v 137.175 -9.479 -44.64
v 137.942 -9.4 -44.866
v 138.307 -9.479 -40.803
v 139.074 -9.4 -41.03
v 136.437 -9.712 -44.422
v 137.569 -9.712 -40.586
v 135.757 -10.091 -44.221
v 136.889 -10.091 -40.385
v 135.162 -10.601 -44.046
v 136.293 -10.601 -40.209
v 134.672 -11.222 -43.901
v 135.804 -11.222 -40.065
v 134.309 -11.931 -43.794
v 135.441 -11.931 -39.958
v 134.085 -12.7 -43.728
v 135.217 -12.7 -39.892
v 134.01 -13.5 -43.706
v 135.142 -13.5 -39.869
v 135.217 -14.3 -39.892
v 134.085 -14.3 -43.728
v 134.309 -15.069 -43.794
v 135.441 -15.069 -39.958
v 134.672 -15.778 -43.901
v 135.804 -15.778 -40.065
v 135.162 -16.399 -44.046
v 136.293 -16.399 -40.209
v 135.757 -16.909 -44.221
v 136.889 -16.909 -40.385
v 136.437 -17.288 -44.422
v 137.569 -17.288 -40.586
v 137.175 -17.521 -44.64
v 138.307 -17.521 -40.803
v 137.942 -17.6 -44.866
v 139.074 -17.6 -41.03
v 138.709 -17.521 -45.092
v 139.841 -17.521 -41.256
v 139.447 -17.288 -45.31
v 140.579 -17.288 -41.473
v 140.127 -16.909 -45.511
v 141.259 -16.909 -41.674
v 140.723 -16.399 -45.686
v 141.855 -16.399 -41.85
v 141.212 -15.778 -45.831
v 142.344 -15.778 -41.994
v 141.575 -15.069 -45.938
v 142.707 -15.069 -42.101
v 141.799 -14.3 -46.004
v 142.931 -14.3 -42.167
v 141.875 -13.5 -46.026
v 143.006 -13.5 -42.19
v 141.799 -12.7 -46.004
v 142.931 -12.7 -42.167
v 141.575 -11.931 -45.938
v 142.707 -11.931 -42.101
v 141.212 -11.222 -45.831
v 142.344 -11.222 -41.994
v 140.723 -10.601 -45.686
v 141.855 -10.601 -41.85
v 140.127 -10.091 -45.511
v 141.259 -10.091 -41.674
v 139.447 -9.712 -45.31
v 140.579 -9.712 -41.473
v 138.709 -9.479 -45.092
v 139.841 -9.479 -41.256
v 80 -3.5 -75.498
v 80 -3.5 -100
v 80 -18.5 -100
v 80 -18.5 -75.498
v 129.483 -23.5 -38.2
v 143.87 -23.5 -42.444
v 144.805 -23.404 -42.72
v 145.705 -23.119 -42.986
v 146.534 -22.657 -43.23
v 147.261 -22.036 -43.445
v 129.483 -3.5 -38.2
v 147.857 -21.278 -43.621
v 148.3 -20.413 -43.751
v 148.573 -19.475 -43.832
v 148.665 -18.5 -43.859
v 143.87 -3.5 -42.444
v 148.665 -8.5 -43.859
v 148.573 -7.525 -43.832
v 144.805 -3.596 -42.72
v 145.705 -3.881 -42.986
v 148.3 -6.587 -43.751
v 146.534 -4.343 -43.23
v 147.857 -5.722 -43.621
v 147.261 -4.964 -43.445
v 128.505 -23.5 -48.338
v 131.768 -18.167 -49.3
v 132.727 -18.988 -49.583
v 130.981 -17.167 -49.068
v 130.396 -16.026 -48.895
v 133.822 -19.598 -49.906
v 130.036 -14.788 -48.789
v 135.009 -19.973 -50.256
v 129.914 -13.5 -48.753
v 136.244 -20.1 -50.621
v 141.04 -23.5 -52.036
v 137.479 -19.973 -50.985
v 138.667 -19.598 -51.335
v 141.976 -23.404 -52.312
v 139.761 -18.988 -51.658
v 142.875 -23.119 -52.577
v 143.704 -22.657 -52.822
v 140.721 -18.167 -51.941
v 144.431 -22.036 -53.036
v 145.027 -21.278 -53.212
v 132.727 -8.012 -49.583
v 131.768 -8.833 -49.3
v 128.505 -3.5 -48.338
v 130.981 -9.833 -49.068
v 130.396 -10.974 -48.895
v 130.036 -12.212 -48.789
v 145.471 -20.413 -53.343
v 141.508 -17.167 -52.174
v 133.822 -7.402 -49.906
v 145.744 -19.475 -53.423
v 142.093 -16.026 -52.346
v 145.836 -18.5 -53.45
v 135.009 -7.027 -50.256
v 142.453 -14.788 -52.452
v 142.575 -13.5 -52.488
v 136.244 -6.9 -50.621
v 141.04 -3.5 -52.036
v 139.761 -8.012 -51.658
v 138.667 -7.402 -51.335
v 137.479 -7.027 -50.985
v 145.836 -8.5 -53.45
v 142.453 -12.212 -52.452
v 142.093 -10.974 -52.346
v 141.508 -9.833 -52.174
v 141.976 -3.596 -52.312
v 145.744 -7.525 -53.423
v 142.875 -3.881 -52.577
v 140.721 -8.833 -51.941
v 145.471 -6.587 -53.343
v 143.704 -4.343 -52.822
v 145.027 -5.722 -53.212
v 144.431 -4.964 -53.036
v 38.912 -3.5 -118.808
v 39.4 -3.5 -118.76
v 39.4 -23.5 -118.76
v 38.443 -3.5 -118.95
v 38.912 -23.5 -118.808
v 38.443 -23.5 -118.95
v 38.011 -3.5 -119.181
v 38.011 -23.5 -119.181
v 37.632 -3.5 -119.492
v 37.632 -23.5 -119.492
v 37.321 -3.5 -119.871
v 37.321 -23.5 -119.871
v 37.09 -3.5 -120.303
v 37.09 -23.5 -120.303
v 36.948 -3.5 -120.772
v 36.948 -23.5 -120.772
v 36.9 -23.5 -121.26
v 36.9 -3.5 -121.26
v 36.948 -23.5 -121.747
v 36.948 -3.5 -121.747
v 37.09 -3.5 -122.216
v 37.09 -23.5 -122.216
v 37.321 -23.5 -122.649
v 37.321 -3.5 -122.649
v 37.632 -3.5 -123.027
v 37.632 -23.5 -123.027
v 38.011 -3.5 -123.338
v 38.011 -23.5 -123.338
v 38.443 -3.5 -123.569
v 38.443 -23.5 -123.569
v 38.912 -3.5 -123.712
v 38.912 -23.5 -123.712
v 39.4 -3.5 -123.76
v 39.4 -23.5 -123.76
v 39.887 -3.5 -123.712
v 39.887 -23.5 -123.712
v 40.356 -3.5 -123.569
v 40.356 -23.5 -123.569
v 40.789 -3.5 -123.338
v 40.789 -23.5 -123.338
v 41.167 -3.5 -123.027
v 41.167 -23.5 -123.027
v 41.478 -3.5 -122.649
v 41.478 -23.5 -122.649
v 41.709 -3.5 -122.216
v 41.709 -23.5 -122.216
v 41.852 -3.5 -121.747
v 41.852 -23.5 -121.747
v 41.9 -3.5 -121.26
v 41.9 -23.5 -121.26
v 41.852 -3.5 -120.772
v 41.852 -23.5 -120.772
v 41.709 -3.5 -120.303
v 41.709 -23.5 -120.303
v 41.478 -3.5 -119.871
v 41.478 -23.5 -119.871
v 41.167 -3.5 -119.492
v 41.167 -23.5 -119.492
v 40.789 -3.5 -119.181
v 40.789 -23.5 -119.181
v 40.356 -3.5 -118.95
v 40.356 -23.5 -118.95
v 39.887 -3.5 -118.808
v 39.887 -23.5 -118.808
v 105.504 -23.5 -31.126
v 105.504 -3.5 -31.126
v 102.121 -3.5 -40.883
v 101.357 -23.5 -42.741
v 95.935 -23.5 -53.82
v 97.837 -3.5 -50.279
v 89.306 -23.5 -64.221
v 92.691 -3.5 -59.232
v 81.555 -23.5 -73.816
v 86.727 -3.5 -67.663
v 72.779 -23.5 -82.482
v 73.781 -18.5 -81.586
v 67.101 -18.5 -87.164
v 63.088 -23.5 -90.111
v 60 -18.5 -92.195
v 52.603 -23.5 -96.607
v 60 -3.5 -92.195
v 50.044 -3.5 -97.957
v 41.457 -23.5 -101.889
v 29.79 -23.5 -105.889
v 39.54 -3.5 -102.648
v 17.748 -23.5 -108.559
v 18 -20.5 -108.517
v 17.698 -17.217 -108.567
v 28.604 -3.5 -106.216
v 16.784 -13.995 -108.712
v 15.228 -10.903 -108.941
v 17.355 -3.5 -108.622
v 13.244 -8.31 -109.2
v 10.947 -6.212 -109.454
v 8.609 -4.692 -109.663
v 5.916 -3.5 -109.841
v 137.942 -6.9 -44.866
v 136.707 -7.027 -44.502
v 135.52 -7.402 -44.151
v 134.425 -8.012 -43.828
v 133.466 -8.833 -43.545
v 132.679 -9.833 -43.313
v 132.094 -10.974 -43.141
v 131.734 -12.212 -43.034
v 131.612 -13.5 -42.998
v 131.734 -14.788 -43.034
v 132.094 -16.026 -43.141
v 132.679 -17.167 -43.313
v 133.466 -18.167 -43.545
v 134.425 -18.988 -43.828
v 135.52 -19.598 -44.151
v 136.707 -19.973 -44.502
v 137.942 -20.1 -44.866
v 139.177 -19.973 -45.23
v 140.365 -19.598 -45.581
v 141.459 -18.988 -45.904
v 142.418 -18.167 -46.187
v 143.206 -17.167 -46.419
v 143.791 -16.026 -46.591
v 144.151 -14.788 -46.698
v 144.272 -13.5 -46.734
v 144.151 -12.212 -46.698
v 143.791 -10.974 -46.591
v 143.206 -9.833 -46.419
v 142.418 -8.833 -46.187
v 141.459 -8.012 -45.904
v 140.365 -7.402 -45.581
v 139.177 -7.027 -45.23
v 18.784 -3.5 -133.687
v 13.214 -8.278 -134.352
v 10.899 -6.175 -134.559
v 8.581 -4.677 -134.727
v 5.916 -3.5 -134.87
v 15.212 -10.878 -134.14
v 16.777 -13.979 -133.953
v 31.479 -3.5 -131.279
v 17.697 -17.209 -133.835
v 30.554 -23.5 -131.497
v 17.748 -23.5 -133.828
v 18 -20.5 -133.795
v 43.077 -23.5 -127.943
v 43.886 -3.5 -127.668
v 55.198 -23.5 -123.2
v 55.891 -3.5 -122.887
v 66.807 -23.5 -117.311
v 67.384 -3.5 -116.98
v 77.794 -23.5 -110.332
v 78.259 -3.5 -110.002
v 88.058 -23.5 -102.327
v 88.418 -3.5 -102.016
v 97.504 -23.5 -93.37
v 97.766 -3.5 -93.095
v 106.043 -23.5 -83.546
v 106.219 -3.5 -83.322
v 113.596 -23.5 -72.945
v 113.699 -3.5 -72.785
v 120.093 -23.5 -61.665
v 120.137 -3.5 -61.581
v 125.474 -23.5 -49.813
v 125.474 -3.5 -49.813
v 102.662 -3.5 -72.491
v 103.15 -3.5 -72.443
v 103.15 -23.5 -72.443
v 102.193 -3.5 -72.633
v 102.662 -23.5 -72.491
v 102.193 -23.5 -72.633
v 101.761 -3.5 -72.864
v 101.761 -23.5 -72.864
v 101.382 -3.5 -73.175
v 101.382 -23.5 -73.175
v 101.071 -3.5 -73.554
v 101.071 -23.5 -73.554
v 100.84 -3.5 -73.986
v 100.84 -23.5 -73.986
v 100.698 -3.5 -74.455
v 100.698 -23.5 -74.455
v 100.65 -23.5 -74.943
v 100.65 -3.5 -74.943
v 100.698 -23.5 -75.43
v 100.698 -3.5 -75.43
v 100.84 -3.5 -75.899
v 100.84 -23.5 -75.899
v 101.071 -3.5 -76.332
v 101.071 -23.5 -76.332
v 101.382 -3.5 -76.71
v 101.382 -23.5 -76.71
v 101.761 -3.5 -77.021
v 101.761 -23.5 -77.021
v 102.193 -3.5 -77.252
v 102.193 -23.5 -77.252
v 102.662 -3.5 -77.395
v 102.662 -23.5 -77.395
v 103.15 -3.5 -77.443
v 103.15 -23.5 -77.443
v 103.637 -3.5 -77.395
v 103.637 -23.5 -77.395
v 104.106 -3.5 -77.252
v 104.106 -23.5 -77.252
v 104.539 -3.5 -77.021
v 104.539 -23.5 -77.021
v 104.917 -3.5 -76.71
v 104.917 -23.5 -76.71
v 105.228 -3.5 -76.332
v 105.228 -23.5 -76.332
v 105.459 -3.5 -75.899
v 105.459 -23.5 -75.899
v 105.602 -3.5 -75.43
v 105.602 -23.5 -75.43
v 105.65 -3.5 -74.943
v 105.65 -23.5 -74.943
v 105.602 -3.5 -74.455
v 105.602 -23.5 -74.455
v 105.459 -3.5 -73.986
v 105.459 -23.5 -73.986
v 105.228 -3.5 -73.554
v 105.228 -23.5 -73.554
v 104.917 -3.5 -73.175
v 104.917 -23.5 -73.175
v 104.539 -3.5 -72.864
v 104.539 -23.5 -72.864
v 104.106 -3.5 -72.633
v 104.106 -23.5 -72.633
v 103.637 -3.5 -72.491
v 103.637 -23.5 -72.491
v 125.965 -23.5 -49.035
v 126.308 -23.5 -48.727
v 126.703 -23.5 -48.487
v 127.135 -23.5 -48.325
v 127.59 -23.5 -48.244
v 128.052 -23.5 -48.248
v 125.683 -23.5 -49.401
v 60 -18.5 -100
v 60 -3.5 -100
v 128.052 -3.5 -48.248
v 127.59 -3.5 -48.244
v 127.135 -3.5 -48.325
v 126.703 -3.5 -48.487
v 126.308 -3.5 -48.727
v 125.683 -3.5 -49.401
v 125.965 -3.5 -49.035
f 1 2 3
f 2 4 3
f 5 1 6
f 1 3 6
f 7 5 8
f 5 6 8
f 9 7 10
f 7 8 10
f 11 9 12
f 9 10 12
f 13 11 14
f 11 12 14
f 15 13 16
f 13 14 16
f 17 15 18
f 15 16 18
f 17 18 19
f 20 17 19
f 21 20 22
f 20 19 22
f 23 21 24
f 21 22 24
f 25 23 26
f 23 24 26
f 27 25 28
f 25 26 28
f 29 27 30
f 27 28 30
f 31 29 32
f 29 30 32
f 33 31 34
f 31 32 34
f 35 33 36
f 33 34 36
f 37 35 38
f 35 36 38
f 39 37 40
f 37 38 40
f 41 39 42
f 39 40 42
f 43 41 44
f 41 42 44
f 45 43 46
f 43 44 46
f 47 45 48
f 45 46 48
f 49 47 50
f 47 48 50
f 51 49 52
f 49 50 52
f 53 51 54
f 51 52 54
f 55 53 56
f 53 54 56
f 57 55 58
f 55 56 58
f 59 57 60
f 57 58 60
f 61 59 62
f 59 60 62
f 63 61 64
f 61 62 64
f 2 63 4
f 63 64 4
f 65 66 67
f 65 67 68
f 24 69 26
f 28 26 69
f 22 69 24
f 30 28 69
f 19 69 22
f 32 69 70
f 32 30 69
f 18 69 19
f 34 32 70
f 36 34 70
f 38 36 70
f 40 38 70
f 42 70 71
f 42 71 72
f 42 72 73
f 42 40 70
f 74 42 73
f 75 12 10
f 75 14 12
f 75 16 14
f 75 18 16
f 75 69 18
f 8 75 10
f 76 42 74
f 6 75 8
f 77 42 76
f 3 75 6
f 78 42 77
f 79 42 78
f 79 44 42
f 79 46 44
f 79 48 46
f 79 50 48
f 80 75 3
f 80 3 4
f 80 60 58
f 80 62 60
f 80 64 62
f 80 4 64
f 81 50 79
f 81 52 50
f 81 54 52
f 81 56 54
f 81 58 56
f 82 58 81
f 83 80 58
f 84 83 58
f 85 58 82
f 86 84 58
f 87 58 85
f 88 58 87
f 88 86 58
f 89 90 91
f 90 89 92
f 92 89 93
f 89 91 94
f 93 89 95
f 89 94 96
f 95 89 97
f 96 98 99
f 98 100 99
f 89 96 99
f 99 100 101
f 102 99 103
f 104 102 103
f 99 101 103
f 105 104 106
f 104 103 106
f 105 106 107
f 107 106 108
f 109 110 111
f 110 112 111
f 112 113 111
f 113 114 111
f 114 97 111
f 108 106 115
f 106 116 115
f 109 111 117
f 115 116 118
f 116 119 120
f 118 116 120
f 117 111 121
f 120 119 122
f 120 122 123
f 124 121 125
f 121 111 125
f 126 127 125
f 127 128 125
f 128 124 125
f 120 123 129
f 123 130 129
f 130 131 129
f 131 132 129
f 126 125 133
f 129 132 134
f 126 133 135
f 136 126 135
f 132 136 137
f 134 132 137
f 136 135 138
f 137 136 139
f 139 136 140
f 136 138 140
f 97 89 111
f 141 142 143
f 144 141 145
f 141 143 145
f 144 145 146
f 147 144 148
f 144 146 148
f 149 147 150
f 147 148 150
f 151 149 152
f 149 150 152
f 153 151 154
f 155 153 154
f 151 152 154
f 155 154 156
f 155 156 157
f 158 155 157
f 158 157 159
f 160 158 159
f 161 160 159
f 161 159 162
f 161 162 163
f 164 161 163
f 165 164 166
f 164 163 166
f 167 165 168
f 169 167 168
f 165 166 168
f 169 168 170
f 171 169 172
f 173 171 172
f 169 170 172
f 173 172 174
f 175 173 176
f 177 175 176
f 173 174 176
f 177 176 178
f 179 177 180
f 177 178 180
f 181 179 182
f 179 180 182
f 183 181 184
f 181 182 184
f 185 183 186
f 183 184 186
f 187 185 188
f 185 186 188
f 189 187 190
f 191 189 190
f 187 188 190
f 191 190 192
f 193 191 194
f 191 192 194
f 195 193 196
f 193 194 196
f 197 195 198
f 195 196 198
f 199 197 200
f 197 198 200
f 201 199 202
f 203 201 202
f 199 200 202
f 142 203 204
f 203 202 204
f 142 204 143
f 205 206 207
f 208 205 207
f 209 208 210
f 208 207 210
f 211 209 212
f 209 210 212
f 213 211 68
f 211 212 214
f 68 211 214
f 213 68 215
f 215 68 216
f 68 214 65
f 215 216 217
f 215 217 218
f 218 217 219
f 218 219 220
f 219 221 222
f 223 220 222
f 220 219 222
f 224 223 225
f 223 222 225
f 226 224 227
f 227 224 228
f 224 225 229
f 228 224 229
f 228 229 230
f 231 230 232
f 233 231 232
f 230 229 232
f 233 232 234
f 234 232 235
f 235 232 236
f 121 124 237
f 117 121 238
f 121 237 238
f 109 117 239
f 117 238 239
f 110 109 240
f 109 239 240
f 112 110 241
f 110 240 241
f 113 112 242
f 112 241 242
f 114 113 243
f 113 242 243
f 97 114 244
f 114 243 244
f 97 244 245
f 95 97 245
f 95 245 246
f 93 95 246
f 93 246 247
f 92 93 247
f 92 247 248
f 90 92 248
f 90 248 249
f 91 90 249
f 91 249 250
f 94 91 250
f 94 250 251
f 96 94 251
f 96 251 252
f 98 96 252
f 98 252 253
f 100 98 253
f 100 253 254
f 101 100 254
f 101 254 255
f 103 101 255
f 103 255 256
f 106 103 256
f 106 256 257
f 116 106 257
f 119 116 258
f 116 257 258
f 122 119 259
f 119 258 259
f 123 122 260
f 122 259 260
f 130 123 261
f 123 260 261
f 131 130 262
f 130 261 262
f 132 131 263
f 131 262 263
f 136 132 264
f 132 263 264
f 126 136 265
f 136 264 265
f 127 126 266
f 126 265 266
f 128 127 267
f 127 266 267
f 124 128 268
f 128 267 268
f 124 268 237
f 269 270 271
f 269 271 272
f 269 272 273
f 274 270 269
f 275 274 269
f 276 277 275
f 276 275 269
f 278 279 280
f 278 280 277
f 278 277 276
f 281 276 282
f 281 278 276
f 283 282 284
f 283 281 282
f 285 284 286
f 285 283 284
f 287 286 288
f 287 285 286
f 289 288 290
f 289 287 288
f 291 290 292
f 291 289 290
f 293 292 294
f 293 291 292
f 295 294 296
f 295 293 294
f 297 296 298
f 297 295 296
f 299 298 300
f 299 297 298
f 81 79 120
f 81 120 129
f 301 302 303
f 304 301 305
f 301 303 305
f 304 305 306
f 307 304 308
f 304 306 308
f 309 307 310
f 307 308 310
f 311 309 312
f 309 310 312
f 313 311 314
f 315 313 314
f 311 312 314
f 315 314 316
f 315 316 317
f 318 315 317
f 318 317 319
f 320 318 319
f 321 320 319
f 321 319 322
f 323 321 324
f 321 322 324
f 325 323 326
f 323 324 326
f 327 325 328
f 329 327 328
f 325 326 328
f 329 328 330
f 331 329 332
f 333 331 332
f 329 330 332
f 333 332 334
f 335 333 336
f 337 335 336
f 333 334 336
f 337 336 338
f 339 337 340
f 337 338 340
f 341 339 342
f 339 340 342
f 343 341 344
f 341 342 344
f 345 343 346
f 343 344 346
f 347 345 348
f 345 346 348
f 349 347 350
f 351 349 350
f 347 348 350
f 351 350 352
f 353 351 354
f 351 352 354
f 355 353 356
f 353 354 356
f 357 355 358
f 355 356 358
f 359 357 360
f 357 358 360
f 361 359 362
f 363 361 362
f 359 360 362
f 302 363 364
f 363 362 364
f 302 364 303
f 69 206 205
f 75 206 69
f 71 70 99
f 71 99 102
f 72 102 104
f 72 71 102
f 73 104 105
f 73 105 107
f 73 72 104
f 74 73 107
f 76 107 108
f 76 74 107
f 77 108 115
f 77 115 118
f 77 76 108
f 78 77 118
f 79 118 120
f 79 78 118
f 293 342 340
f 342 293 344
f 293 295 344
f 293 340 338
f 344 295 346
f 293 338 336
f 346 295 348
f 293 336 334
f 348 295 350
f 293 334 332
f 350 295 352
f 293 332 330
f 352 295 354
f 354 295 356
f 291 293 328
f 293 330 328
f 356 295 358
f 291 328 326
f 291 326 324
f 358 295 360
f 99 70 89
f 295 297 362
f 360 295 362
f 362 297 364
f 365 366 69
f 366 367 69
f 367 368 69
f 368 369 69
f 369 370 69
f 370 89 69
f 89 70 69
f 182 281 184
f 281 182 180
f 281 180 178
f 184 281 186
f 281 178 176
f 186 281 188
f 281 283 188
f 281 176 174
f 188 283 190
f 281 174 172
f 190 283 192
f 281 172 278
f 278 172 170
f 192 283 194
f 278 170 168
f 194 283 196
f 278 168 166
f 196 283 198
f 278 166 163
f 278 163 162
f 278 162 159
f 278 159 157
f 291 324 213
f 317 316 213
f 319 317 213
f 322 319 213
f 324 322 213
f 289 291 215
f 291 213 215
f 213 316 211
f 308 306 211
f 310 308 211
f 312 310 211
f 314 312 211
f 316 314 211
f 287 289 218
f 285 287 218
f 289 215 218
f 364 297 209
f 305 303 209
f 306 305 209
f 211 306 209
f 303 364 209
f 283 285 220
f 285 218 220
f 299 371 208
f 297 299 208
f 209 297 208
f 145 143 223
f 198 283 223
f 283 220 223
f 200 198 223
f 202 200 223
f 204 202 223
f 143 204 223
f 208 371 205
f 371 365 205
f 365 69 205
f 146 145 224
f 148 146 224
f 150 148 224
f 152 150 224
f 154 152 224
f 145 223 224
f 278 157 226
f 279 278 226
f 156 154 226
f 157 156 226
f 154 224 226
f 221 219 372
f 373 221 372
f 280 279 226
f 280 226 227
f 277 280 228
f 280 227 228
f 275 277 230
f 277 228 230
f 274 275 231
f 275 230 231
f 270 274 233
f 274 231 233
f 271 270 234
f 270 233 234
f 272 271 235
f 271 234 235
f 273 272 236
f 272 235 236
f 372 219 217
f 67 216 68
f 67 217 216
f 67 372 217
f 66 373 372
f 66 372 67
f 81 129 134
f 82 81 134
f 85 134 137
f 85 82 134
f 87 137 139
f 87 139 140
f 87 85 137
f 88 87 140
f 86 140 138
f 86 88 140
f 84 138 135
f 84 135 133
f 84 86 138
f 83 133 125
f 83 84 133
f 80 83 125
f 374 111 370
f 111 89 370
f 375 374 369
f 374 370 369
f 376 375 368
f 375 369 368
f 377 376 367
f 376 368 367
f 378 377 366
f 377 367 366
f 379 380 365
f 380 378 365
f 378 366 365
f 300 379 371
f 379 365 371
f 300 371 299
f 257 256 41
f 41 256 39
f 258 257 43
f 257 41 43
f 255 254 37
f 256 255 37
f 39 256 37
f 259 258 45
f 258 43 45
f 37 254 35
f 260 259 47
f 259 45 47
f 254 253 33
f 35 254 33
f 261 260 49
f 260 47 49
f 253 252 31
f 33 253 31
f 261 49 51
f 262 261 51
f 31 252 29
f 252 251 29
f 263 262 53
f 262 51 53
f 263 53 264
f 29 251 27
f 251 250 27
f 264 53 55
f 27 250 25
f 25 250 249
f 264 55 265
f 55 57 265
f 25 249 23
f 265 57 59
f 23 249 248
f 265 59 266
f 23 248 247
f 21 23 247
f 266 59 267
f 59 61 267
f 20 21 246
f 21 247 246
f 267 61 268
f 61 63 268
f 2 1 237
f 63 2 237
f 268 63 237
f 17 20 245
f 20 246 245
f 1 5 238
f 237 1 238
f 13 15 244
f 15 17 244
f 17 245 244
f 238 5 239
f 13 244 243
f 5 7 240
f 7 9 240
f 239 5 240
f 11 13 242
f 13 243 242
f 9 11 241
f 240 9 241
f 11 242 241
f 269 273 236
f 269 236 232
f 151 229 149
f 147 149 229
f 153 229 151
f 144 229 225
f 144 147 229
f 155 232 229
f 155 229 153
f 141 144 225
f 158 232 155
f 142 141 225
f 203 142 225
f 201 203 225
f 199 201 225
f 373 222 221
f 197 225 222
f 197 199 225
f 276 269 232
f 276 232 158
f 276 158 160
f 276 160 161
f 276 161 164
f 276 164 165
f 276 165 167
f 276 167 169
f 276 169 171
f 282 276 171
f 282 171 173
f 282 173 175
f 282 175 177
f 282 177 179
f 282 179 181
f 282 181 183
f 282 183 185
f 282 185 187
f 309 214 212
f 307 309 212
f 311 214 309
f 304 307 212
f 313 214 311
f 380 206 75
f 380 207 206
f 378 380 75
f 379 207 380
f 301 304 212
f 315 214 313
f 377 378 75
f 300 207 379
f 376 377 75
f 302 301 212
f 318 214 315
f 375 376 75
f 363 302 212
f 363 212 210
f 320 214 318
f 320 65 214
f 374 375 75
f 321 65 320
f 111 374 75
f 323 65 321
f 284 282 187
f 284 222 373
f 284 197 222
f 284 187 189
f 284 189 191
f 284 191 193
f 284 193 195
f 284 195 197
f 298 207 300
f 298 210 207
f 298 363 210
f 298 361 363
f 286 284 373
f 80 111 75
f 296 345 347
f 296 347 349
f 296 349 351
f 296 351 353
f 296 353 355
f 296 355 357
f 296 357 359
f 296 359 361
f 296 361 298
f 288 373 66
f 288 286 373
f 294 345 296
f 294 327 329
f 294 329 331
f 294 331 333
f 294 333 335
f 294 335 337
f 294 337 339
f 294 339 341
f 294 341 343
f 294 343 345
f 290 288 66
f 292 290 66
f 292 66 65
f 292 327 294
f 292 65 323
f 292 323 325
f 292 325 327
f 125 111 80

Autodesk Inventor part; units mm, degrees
ref_plane "YZ Plane" through (0, 0, 0) normal (1, 0, 0) x (0, 1, 0)
ref_plane "XZ Plane" through (0, 0, 0) normal (0, 1, 0) x (-1, 0, 0)
ref_plane "XY Plane" through (0, 0, 0) normal (0, 0, 1) x (1, 0, 0)
sketch "Sketch1" plane through (0, 0, 0) normal (0, 1, 0) x (-1, 0, 0)
  circle A0 centre (0, 0) radius 135
  circle A1 centre (0, 0) radius 110
  dimension "d0" = 270
  dimension "d1" = 220
extrude "Extrusion1" add sketch "Sketch1" along normal mid plane 47
sketch "Sketch2" plane through (0, 0, 0) normal (0, 0, 1) x (1, 0, 0)
  circle A0 centre (0, -20.5) radius 18
  line L0 (-135, -23.5) -> (135, -23.5) projected
  dimension "d4" = 36
  dimension "d38" = 3
extrude "Extrusion2" cut sketch "Sketch2" against normal through all
sketch "Sketch3" plane through (0, 23.5, 0) normal (0, 1, 0) x (1, 0, 0)
  circle A0 centre (0, 0) radius 127.5
  circle A1 centre (-127.5, 0) radius 2
  circle A2 centre (-103.1497, -74.9426) radius 2
  circle A3 centre (-39.3997, -121.2597) radius 2
  circle A4 centre (39.3997, -121.2597) radius 2
  circle A5 centre (103.1497, -74.9426) radius 2
  circle A6 centre (127.5, 0) radius 2
  circle A7 centre (103.1497, 74.9426) radius 2
  circle A8 centre (39.3997, 121.2597) radius 2
  circle A9 centre (-39.3997, 121.2597) radius 2
  circle A10 centre (-103.1497, 74.9426) radius 2
  dimension "d7" = 255
  dimension "d8" = 4
  dimension "d11" = 360
hole "Hole1" at (39.3997, 23.5, 121.2597) at (-39.3997, 23.5, 121.2597) at (-103.1497, 23.5, 74.9426) at (-127.5, 23.5, 0) at (-103.1497, 23.5, -74.9426) at (-39.3997, 23.5, -121.2597) at (39.3997, 23.5, -121.2597) at (103.1497, 23.5, -74.9426) at (127.5, 23.5, 0) at (103.1497, 23.5, 74.9426) direction (0, -1, 0) diameter 5 end through all
sketch "Sketch4" plane through (0, 23.5, 0) normal (0, 1, 0) x (1, 0, 0)
  circle A0 centre (0, 0) radius 140
extrude "Extrusion3" cut sketch "Sketch4" against normal blind 27
sketch "Sketch7" plane through (0, -3.5, 0) normal (0, 1, 0) x (1, 0, 0)
  line L0 (0, 0) -> (70, 0)
  line L1 (80, -100) -> (60, -100)
  line L2 (60, -100) -> (60, 100)
  line L3 (60, 100) -> (80, 100)
  line L4 (80, 100) -> (80, -100)
  line L5 (80, -100) -> (60, 100) construction
  line L6 (60, -100) -> (80, 100) construction
  dimension "d39" = 70
  dimension "d40" = 20
  dimension "d41" = 200
extrude "Extrusion7" cut sketch "Sketch7" against normal blind 15
sketch "Sketch8" plane through (0, -3.5, 0) normal (0, 1, 0) x (1, 0, 0)
  line L0 (-129.4827, -38.1999) -> (129.4827, 38.1999)
  line L1 (0, 134.8703) -> (0, -135)
  arc A0 (-5.9161, 134.8703) -> (5.9161, 134.8703) centre (0, 0) ccw projected
extrude "Extrusion8" cut sketch "Sketch8" against normal through all
sketch "Sketch9" plane through (0, -3.5, 0) normal (0, 1, 0) x (1, 0, 0)
  line L0 (-129.4827, -38.1999) -> (-105.5044, -31.1258) projected
  arc A0 (-5.9161, 109.8408) -> (-105.5044, -31.1258) centre (0, 0) ccw projected
  line L1 (-5.9161, 134.8703) -> (-5.9161, 109.8408) projected
  arc A1 (-5.9161, 134.8703) -> (-129.4827, -38.1999) centre (0, 0) ccw projected
  circle A2 centre (-39.3997, 121.2597) radius 2.5 projected
  circle A3 centre (-103.1497, 74.9426) radius 2.5 projected
  circle A4 centre (-127.5, 0) radius 2.5 projected
extrude "Extrusion9" cut sketch "Sketch9" against normal through all
sketch "Sketch10" plane through (129.4827, -23.5, -38.1999) normal (0.2829619, 0, 0.9591312) x (0.9591312, 0, -0.2829619)
  line L0 (0, 0) -> (-25, 0) projected
  line L1 (-2.5, 0) -> (15, 0)
  line L2 (20, 5) -> (20, 15)
  line L3 (15, 20) -> (-2.5, 20)
  line L4 (-2.5, 20) -> (-2.5, 0)
  line L5 (0, 20) -> (0, 0) projected
  arc A0 (20, 15) -> (15, 20) centre (15, 15) ccw
  arc A1 (15, 0) -> (20, 5) centre (15, 5) ccw
  point P0 (-135, 23.5)
  point P1 (20, 20)
  point P2 (20, 0)
  point P3 (0, 0)
  dimension "d48" = 22.5
  dimension "d49" = 20
  dimension "d50" = 20
  dimension "d53" = 5
extrude "Extrusion10" add sketch "Sketch10" against normal blind 10
fillet "Fillet1" radius 2.5 1 edges at (126.2974, -13.5, -47.6862)
sketch "Sketch11" plane through (126.6531, -23.5, -47.7912) normal (-0.2829619, 0, -0.9591312) x (-0.9591312, 0, 0.2829619)
  line L0 (-1.9306, 20) -> (-15, 20) projected
  line L1 (-20, 15) -> (-20, 5) projected
  point P0 (135, 23.5)
  point P1 (-10, 10)
  dimension "d55" = 10
  dimension "d56" = 10
hole "Hole2" at (136.2444, -13.5, -50.6208) direction (0.2829619, 0, 0.9591312) diameter 8.2 end through all counterbore diameter 13.2 counterbore depth 6
properties part number "Cylinder Spacer Bottom_Q2"
